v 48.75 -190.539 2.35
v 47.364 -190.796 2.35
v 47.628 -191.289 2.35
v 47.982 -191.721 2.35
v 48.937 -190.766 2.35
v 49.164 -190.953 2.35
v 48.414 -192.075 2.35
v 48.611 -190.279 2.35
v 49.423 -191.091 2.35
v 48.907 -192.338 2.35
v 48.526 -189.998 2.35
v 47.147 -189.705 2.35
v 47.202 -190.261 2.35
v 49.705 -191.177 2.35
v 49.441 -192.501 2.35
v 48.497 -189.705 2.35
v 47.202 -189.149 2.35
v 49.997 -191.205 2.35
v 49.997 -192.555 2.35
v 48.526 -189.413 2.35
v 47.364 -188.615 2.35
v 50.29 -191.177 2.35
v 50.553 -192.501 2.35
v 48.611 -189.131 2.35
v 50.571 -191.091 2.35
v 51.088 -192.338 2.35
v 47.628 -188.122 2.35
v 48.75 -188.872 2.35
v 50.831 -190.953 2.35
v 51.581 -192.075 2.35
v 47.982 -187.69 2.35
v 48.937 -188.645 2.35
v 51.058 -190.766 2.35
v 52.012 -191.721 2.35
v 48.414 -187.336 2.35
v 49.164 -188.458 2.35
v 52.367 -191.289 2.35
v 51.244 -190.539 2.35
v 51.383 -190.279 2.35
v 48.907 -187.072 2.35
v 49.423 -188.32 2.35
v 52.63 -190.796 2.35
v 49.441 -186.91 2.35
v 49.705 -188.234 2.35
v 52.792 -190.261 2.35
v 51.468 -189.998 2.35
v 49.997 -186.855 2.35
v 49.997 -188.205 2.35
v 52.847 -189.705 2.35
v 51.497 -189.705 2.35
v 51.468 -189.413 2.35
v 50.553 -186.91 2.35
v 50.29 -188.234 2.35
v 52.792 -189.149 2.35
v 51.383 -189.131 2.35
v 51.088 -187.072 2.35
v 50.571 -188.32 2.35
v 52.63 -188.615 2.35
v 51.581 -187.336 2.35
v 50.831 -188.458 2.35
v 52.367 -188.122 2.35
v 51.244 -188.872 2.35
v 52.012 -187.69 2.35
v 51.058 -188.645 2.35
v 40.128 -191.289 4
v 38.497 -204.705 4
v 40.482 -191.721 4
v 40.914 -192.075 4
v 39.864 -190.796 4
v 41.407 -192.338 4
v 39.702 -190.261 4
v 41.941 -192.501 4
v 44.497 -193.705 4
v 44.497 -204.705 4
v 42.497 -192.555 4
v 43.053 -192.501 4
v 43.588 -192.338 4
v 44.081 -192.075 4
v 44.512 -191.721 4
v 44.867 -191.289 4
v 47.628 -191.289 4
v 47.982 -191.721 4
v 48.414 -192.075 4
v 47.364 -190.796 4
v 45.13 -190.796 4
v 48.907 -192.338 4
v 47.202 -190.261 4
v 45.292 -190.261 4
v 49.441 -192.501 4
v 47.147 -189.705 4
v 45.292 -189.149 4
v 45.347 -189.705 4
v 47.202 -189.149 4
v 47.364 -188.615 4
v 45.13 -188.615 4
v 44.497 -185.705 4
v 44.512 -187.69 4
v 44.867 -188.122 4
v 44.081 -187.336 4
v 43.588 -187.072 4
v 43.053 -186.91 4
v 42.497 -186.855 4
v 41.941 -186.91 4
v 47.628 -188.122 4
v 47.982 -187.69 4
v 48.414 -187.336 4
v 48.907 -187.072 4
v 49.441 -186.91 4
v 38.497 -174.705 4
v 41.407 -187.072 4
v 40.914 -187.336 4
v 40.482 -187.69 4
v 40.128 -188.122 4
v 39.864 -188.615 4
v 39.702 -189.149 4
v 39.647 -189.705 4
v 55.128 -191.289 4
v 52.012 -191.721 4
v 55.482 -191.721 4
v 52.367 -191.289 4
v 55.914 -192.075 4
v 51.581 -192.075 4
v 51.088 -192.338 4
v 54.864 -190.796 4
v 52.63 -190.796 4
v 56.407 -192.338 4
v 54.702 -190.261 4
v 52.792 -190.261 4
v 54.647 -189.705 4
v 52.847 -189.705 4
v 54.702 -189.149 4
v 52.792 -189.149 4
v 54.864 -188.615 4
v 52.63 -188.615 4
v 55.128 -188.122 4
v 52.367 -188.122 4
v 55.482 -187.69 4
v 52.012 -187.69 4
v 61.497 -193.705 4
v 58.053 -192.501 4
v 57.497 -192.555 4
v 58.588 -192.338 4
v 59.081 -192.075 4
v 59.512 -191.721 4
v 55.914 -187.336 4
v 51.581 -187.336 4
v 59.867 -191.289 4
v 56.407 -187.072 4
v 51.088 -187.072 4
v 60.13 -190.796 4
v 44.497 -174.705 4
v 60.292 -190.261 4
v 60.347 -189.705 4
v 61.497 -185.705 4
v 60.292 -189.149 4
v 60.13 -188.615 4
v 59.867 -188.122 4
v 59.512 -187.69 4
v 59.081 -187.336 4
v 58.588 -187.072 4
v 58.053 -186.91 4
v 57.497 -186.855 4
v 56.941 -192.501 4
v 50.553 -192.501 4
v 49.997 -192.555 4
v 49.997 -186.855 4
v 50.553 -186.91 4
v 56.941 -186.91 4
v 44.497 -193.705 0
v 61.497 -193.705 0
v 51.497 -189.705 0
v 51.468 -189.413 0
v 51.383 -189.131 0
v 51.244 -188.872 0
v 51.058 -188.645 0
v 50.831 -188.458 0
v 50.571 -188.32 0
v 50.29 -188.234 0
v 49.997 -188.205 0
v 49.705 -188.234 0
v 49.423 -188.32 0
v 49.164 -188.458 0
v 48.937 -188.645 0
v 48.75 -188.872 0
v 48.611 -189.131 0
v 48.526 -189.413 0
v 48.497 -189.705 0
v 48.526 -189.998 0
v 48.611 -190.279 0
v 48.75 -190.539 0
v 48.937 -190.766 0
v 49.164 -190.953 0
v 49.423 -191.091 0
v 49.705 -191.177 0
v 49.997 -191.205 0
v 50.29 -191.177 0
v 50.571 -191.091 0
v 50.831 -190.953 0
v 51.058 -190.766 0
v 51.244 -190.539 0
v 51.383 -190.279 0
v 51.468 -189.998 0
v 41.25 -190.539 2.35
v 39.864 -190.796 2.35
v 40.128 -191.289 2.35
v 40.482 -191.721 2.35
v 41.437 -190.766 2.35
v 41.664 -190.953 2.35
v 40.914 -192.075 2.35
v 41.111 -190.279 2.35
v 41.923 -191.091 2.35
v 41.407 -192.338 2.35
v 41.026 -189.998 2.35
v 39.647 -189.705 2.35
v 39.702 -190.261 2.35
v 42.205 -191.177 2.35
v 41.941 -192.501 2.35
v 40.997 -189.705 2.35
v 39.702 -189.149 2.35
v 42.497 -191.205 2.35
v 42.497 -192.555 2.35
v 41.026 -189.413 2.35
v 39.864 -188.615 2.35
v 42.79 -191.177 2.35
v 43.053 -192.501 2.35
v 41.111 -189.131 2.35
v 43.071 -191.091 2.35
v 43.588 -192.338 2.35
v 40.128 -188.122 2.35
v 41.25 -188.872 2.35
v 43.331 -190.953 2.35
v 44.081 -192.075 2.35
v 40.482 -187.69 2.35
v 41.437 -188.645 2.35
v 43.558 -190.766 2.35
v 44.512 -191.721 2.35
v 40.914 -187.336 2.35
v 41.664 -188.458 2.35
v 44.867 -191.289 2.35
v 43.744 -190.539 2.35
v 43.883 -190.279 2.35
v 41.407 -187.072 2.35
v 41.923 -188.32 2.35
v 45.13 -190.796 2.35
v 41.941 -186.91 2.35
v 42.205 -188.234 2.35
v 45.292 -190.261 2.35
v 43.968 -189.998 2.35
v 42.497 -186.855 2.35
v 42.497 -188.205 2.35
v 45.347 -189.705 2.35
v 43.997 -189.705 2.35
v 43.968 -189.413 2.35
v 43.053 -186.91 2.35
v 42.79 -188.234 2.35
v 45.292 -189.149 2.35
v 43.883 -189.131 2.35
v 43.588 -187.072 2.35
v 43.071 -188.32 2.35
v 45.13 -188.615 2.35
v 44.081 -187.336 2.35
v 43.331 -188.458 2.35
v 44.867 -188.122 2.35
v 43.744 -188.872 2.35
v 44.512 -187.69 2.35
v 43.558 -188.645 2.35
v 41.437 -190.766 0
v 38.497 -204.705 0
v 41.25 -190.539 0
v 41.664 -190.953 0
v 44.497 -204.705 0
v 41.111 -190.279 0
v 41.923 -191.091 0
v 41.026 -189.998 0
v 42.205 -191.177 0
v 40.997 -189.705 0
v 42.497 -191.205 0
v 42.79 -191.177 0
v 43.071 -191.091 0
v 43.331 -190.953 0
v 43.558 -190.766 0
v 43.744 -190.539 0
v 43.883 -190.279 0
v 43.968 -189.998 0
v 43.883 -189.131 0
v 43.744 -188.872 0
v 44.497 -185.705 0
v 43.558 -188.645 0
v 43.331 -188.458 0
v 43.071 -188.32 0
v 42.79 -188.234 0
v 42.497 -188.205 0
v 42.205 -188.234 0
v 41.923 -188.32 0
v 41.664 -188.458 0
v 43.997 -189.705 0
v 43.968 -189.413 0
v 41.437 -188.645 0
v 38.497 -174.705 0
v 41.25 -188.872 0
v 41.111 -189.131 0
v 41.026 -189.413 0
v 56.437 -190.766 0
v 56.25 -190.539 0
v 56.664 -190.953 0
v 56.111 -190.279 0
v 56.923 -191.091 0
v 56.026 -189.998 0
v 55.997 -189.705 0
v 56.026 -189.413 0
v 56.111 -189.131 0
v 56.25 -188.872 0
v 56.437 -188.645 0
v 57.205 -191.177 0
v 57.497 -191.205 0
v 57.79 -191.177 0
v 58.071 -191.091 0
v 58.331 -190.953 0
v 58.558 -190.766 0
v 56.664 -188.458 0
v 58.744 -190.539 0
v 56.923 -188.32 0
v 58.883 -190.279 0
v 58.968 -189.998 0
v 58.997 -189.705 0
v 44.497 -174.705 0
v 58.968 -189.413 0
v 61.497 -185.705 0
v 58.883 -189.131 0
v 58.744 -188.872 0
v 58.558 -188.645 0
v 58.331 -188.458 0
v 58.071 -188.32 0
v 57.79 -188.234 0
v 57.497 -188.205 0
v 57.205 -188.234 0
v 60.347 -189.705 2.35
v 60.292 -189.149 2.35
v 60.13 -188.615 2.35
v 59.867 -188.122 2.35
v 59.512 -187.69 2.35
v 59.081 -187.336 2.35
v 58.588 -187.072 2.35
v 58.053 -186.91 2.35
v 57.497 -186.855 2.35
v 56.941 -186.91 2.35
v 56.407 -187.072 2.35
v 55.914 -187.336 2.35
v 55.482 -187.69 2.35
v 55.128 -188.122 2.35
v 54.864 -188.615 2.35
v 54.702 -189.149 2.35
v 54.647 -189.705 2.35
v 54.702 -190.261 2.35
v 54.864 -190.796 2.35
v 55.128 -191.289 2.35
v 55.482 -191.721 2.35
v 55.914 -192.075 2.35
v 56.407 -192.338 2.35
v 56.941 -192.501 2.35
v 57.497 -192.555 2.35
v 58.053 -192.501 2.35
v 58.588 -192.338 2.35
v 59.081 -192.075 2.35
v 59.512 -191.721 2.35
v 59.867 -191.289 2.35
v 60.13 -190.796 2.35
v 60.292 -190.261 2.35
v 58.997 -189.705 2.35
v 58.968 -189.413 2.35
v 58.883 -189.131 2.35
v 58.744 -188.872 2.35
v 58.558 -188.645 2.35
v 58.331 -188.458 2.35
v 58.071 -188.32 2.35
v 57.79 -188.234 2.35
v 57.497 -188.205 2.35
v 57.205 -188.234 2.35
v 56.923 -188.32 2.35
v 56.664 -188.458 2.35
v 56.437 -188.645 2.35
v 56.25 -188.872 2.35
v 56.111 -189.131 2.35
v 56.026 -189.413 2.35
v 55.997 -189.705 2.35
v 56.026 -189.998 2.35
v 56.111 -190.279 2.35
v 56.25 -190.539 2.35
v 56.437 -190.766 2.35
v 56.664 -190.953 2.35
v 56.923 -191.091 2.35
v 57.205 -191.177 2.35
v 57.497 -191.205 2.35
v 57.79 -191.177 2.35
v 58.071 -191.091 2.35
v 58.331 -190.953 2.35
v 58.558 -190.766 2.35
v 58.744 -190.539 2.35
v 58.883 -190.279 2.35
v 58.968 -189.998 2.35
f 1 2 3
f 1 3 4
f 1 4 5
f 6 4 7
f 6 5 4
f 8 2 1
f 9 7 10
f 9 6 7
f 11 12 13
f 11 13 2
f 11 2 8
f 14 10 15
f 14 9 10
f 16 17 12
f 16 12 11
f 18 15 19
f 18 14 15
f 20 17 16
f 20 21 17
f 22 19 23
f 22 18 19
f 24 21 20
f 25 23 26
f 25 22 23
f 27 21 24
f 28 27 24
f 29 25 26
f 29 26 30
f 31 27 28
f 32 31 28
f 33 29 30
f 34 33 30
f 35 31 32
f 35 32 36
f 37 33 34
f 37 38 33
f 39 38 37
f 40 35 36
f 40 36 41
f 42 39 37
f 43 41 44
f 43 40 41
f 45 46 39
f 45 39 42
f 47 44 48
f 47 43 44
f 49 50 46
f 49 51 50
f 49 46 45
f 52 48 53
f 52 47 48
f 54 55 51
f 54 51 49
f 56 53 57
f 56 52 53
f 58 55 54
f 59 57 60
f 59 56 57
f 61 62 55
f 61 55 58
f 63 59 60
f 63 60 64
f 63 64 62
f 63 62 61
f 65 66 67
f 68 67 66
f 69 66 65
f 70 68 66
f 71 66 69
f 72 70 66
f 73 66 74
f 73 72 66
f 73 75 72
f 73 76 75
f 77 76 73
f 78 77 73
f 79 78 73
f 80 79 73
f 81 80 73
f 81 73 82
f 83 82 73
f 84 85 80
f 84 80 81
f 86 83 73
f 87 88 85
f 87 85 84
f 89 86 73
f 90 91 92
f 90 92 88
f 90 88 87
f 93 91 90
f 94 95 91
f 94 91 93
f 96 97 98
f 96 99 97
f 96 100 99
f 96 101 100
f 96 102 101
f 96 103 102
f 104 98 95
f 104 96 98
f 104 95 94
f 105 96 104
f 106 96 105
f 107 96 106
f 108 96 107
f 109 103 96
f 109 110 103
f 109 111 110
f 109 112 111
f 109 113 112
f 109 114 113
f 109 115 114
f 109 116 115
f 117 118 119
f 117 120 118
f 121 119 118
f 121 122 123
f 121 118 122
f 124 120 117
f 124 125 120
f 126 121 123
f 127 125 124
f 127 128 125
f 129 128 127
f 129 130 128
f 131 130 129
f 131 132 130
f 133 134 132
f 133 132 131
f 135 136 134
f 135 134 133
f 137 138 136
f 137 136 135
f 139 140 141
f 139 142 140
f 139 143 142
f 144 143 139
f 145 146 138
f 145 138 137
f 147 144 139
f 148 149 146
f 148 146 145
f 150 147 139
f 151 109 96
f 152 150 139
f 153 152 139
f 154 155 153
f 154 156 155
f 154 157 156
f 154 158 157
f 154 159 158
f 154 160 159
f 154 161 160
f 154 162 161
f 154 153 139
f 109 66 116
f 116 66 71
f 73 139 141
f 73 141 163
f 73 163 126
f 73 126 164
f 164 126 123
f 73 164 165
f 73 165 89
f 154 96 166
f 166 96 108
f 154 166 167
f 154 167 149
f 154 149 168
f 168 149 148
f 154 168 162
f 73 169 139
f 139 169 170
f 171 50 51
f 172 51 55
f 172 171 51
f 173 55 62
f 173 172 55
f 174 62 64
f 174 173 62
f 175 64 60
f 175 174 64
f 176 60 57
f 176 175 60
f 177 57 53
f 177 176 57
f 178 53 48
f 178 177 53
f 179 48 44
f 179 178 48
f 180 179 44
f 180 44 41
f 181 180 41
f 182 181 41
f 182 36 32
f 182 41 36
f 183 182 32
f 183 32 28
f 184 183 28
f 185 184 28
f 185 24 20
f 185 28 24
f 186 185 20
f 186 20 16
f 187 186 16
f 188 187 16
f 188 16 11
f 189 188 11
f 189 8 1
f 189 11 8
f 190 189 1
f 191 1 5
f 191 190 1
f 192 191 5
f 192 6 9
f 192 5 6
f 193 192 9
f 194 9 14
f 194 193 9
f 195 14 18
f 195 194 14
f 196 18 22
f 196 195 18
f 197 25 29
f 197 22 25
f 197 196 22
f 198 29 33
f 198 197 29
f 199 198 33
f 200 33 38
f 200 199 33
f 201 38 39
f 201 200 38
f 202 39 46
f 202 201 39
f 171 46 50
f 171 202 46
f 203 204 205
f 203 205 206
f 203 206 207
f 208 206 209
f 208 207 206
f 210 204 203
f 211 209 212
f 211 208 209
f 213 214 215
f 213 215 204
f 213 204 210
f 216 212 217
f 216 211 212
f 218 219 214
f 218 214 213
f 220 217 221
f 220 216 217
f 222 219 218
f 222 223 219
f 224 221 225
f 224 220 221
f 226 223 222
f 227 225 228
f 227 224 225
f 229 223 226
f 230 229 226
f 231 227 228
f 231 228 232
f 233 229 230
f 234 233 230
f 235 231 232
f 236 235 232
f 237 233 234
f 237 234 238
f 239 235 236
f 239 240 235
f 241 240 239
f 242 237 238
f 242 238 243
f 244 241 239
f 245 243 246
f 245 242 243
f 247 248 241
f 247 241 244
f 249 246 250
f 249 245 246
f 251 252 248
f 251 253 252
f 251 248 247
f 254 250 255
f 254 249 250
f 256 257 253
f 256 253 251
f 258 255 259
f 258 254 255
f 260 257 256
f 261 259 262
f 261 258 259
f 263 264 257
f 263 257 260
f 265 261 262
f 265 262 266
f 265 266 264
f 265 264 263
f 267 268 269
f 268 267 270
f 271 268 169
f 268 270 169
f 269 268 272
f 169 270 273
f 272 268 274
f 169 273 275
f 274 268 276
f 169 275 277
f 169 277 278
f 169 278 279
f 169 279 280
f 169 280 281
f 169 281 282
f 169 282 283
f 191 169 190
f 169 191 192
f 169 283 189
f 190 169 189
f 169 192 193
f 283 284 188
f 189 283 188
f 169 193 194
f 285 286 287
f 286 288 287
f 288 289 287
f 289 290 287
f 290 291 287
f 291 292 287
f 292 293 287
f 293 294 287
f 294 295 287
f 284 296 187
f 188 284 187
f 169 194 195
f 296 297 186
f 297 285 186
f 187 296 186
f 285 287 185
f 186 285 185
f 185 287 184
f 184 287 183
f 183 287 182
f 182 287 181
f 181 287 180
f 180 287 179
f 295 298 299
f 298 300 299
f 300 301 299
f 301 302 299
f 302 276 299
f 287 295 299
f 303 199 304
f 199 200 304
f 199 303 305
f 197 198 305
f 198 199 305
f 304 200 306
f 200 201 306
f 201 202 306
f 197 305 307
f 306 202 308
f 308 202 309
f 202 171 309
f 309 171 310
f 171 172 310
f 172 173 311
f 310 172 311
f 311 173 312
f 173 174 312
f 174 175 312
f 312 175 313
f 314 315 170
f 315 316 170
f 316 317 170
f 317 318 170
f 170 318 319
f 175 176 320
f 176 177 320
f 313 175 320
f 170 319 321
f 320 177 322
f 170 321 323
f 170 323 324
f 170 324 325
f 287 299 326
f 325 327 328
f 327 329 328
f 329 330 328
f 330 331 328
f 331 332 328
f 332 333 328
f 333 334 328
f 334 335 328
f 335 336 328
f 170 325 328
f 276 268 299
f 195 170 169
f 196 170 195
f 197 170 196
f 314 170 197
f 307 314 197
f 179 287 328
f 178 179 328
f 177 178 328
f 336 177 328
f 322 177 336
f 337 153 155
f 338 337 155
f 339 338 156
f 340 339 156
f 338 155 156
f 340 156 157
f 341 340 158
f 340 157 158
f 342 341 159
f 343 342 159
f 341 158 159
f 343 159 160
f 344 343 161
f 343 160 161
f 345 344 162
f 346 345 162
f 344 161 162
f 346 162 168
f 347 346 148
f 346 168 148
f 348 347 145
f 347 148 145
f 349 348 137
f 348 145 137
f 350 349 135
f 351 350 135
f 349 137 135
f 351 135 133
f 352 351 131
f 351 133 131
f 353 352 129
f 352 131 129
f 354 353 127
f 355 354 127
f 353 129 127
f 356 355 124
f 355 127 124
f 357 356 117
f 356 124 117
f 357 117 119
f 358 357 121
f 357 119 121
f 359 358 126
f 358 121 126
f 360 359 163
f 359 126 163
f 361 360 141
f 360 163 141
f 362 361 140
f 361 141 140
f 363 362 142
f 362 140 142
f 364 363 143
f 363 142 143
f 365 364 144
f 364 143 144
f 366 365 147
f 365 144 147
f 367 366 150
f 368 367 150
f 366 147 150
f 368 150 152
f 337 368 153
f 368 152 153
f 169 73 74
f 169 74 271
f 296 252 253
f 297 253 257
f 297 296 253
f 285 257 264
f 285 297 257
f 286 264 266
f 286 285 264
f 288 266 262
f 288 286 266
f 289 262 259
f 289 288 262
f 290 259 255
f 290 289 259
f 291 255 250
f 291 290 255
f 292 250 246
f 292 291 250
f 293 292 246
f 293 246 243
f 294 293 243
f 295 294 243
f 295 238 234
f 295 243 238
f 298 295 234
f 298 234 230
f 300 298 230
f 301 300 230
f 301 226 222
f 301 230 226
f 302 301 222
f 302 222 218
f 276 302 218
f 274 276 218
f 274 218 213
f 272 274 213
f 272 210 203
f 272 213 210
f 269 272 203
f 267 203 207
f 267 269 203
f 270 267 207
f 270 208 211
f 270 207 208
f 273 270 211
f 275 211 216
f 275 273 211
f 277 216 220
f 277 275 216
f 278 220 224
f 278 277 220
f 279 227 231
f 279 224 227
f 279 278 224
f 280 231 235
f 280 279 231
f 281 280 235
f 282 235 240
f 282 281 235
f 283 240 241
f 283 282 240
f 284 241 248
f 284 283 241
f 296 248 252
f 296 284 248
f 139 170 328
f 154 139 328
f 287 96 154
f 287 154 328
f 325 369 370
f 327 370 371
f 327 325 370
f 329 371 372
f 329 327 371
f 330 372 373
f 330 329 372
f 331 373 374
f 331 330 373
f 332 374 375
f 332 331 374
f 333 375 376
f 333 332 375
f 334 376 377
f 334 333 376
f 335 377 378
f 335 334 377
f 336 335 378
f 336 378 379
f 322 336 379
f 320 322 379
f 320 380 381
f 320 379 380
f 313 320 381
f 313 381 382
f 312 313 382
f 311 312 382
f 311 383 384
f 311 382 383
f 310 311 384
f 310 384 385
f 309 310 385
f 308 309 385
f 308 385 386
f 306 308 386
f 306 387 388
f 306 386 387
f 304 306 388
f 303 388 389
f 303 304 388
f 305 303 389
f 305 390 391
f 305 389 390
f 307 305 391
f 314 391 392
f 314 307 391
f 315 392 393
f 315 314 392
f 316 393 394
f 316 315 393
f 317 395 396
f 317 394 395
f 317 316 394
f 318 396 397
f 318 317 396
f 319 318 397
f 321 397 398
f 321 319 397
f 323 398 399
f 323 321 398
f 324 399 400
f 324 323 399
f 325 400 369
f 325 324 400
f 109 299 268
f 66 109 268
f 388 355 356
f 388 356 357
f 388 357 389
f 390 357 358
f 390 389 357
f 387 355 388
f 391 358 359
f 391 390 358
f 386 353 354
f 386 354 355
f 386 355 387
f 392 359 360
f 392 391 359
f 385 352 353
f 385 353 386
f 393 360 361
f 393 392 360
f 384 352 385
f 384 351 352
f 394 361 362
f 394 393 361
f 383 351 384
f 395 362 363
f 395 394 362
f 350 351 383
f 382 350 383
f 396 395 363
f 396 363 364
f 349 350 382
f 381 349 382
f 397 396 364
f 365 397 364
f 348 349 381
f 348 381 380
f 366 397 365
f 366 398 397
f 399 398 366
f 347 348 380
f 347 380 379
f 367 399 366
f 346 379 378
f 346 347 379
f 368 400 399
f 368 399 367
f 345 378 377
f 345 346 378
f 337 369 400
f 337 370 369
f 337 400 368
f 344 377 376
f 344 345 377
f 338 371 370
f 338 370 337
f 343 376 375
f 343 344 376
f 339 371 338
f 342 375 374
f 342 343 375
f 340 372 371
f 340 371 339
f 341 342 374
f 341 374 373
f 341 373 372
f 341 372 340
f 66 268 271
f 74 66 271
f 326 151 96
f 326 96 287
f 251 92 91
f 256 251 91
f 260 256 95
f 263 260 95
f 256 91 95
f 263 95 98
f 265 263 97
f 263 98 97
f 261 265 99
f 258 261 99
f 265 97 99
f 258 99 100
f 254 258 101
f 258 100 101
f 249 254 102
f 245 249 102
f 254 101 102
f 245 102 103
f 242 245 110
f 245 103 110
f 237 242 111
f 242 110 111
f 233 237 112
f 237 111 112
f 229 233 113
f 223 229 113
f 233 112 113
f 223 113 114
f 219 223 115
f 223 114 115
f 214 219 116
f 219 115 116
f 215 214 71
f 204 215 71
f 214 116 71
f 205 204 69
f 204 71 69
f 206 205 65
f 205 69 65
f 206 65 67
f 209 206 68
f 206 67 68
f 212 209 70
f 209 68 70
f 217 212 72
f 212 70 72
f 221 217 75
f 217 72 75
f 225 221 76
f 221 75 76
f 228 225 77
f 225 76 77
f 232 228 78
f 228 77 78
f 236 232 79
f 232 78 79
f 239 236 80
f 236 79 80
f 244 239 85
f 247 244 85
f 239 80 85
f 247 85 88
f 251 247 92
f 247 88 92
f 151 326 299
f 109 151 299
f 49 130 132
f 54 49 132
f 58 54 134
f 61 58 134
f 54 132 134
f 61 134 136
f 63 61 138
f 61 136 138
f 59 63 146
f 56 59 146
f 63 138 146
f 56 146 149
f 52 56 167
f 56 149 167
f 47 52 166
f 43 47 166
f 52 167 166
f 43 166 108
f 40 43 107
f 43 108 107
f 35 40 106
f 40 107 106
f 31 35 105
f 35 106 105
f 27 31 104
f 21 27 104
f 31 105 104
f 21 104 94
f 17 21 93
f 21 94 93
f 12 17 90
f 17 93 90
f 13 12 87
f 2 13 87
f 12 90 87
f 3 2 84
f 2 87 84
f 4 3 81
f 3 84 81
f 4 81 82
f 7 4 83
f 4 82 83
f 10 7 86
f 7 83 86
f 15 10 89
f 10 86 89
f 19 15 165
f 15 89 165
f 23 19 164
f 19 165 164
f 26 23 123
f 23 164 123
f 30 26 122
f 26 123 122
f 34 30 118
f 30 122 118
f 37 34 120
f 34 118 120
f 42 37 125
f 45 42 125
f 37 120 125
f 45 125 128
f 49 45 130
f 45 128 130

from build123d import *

# Parameters (mm, degrees)
CROQUIS2_R              = 1.5
SALIENTE_EXTRUIR1_DEPTH = 4
CROQUIS3_R              = 2.85
CORTAR_EXTRUIR1_DEPTH   = 1.65
CROQUIS4_W              = 4
CROQUIS4_H              = 11
CORTAR_EXTRUIR2_DEPTH   = 2


with BuildPart() as part:
    # Croquis2 → Saliente-Extruir1 (new body)
    with BuildSketch(Plane.XY):
        Polygon((38.497217209, -204.70543153), (46.497217209, -204.70543153), (46.497217209, -193.70543153), (61.497217209, -193.70543153), (61.497217209, -185.70543153), (46.497217209, -185.70543153), (46.497217209, -174.70543153), (38.497217209, -174.70543153), align=None)
        with Locations((42.497217209, -189.70543153)):
            Circle(CROQUIS2_R, mode=Mode.SUBTRACT)
        with Locations((57.497217209, -189.70543153)):
            Circle(CROQUIS2_R, mode=Mode.SUBTRACT)
        with Locations((49.997217209, -189.70543153)):
            Circle(CROQUIS2_R, mode=Mode.SUBTRACT)
    extrude(amount=SALIENTE_EXTRUIR1_DEPTH)

    # Croquis3 → Cortar-Extruir1 (cut)
    with BuildSketch(Plane.XY.offset(4)):
        with Locations((42.497217209, -189.70543153)):
            Circle(CROQUIS3_R)
        with Locations((49.997217209, -189.70543153)):
            Circle(CROQUIS3_R)
        with Locations((57.497217209, -189.70543153)):
            Circle(CROQUIS3_R)
    extrude(amount=-CORTAR_EXTRUIR1_DEPTH, mode=Mode.SUBTRACT)

    # Croquis4 → Cortar-Extruir2 (cut)
    with BuildSketch(Plane(origin=(46.497217209, 0, 0), x_dir=(0, 0, -1), z_dir=(1, 0, 0))):
        with Locations((-2, -199.20543153)):
            Rectangle(CROQUIS4_W, CROQUIS4_H)
        with Locations((-2, -180.20543153)):
            Rectangle(CROQUIS4_W, CROQUIS4_H)
    extrude(amount=-CORTAR_EXTRUIR2_DEPTH, mode=Mode.SUBTRACT)


solid = part.part
